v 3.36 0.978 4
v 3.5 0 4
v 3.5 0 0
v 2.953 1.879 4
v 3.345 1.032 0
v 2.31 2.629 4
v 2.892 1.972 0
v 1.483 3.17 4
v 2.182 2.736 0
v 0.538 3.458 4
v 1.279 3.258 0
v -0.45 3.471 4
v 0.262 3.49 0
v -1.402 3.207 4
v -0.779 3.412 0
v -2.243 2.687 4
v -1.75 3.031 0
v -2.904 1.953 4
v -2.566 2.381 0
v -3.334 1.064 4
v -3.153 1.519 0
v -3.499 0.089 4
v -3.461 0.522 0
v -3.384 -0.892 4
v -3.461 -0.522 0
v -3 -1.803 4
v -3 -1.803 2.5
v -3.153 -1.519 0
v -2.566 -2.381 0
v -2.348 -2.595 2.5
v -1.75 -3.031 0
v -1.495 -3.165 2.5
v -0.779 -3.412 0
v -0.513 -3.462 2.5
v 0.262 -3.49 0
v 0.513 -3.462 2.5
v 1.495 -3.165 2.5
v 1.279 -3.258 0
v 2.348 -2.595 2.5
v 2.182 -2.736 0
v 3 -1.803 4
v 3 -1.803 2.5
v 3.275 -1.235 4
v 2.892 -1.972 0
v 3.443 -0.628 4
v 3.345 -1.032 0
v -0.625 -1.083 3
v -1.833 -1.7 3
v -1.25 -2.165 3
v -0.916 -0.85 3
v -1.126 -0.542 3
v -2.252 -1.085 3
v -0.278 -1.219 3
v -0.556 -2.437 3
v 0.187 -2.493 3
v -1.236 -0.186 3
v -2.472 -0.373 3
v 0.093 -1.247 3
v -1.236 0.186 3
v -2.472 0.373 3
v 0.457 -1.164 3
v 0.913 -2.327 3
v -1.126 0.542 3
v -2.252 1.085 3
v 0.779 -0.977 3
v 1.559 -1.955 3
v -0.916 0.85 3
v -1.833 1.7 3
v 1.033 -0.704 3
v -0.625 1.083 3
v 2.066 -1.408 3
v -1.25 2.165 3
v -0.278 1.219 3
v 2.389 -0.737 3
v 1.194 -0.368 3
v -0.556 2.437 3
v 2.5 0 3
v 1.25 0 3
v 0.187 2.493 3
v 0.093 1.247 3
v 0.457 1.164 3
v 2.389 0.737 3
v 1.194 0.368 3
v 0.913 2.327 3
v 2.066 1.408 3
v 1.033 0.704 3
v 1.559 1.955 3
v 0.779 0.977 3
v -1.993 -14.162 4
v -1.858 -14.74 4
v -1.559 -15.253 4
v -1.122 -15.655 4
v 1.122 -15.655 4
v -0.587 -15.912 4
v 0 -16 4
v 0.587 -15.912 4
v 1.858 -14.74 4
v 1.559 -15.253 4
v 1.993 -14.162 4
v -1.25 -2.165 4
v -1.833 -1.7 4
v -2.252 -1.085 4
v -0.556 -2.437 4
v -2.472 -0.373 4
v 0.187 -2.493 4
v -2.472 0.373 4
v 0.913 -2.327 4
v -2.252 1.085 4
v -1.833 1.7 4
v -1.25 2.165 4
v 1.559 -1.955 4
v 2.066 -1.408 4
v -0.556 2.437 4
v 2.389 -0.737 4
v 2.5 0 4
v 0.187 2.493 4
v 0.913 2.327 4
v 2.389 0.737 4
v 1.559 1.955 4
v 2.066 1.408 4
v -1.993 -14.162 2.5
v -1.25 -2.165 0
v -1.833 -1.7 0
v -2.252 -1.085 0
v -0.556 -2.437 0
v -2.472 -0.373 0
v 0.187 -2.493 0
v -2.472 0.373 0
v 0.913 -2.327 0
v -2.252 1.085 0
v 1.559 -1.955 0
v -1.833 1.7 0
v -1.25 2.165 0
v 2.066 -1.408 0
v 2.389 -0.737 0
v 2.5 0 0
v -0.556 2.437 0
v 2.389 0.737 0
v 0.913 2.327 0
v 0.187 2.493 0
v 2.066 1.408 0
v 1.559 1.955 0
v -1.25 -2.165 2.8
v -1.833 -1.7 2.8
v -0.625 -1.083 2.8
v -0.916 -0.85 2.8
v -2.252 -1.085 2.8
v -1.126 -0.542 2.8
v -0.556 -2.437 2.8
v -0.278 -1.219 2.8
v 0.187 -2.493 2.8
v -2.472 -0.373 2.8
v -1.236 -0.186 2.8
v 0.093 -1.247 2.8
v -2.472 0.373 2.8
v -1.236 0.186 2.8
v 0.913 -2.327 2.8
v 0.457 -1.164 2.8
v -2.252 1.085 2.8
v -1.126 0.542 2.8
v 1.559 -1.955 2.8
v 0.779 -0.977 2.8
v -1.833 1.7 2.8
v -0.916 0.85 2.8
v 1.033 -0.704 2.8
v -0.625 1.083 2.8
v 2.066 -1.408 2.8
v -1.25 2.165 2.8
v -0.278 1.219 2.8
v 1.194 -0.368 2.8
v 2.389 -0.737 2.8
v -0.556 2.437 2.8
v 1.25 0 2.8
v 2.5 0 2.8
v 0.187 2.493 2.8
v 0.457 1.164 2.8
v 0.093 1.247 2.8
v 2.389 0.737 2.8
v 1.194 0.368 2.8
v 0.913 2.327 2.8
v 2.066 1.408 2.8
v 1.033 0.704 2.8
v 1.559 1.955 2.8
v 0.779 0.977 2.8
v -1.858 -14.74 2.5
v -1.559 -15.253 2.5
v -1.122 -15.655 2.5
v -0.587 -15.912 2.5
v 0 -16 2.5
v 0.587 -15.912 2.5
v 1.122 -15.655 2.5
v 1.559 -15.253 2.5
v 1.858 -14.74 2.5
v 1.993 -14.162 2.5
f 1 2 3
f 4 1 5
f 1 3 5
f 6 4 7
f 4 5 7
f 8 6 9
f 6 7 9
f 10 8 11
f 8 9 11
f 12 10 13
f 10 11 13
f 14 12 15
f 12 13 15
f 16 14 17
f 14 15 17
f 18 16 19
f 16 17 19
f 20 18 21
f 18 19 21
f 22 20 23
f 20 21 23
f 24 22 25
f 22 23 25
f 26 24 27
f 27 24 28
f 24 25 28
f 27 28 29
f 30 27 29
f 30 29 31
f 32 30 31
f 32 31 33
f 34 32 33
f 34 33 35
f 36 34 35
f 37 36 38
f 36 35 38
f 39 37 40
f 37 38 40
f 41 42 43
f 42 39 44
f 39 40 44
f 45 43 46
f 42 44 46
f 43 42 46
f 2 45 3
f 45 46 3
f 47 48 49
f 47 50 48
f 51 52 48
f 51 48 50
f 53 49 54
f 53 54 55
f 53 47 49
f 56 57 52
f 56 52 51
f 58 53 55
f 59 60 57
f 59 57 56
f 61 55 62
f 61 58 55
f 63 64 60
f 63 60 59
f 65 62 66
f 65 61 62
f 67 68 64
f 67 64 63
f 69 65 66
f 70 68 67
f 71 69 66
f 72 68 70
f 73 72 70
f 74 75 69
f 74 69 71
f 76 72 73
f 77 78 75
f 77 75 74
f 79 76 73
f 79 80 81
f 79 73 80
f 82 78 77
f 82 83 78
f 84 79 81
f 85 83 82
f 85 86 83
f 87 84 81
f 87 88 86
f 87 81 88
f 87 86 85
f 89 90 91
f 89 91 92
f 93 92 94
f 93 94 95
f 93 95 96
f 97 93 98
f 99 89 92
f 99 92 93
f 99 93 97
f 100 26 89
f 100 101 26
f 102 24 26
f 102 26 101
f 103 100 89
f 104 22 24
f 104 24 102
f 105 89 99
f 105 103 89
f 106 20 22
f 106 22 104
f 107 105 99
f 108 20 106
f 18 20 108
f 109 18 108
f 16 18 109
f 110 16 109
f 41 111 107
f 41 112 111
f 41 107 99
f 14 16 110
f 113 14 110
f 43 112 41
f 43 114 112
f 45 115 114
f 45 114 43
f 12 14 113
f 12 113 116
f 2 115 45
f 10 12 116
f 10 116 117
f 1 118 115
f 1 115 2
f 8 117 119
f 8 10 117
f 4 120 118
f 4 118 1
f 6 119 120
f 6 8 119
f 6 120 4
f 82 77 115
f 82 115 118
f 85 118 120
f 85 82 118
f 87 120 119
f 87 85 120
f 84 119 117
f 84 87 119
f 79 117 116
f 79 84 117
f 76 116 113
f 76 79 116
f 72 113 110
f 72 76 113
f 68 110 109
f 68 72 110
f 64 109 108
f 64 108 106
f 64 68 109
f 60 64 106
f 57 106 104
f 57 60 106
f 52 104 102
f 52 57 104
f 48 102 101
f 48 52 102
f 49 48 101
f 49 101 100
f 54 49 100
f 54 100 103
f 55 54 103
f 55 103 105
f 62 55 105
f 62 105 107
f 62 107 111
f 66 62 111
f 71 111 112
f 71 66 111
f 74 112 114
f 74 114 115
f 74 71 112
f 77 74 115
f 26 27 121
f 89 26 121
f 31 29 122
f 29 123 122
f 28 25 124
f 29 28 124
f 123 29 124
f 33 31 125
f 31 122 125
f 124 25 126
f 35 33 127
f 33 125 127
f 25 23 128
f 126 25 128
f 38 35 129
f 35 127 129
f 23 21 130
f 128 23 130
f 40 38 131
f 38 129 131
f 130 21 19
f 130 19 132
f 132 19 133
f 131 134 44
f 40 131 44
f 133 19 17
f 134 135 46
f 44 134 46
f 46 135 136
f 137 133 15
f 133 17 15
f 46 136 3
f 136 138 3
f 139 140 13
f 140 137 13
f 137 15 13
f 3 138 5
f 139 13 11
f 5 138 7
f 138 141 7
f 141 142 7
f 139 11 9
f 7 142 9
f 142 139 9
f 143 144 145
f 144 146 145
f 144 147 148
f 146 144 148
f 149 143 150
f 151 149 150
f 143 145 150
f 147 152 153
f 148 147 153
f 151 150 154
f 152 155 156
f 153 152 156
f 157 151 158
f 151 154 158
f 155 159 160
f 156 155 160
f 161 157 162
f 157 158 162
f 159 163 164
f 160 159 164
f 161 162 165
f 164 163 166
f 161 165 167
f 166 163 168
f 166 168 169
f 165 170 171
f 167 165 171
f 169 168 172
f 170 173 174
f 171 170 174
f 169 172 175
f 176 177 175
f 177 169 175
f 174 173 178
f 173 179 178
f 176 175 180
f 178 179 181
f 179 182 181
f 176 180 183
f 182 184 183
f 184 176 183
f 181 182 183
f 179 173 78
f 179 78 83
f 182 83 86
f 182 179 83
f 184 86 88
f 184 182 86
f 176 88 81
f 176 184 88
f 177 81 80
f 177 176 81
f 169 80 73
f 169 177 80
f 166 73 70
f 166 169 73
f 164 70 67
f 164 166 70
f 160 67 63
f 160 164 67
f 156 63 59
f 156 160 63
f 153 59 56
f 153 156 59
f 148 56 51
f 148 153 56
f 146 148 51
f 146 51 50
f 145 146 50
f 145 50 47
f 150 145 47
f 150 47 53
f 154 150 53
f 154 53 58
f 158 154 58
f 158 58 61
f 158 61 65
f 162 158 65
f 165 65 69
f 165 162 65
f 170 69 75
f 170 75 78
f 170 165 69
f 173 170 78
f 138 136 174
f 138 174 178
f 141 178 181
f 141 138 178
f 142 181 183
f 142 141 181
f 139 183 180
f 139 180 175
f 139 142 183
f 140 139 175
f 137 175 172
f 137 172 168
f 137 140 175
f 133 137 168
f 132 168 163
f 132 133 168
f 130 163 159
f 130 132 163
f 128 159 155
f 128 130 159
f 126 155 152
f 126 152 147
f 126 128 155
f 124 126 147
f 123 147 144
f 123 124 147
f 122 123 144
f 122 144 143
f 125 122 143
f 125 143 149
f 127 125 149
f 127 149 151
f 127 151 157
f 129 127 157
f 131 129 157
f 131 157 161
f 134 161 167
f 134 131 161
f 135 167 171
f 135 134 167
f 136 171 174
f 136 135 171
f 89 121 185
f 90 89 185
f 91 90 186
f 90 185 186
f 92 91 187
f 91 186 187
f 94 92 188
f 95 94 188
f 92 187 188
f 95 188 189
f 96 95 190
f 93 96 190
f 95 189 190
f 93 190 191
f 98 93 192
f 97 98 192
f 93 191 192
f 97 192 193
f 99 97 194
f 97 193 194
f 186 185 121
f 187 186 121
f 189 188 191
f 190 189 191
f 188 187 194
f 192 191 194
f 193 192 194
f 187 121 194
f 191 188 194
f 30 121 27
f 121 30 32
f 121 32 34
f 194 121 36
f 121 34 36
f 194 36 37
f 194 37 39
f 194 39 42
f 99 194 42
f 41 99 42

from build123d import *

# Parameters (mm, degrees)
SKETCH1_R           = 3.5
SKETCH1_R_2         = 2.5
BOSS_EXTRUDE1_DEPTH = 2.8
SKETCH2_R           = 3.5
SKETCH2_R_2         = 1.25
BOSS_EXTRUDE2_DEPTH = 0.2
SKETCH3_R           = 3.5
SKETCH3_R_2         = 2.5
BOSS_EXTRUDE3_DEPTH = 1
BOSS_EXTRUDE4_START = -1.5
BOSS_EXTRUDE4_DEPTH = 1.5


with BuildPart() as part:
    # Sketch1 → Boss-Extrude1 (new body)
    with BuildSketch(Plane.XY):
        Circle(SKETCH1_R)
        Circle(SKETCH1_R_2, mode=Mode.SUBTRACT)
    extrude(amount=BOSS_EXTRUDE1_DEPTH)

    # Sketch2 → Boss-Extrude2 (add)
    with BuildSketch(Plane.XY.offset(2.8)):
        Circle(SKETCH2_R)
        Circle(SKETCH2_R_2, mode=Mode.SUBTRACT)
    extrude(amount=BOSS_EXTRUDE2_DEPTH)

    # Sketch3 → Boss-Extrude3 (add)
    with BuildSketch(Plane.XY.offset(3)):
        Circle(SKETCH3_R)
        Circle(SKETCH3_R_2, mode=Mode.SUBTRACT)
    extrude(amount=BOSS_EXTRUDE3_DEPTH)

    # Sketch4 → Boss-Extrude4 (add)
    with BuildSketch(Plane.XY.offset(4).offset(BOSS_EXTRUDE4_START)):
        with BuildLine():
            Line((-3, -1.802775638), (-1.993399861, -14.162348377))
            ThreePointArc((-1.993399861, -14.162348377), (0, -16), (1.993399861, -14.162348377))
            Line((1.993399861, -14.162348377), (3, -1.802775638))
            ThreePointArc((3, -1.802775638), (0, -3.5), (-3, -1.802775638))
        make_face()
    extrude(amount=BOSS_EXTRUDE4_DEPTH)


solid = part.part
